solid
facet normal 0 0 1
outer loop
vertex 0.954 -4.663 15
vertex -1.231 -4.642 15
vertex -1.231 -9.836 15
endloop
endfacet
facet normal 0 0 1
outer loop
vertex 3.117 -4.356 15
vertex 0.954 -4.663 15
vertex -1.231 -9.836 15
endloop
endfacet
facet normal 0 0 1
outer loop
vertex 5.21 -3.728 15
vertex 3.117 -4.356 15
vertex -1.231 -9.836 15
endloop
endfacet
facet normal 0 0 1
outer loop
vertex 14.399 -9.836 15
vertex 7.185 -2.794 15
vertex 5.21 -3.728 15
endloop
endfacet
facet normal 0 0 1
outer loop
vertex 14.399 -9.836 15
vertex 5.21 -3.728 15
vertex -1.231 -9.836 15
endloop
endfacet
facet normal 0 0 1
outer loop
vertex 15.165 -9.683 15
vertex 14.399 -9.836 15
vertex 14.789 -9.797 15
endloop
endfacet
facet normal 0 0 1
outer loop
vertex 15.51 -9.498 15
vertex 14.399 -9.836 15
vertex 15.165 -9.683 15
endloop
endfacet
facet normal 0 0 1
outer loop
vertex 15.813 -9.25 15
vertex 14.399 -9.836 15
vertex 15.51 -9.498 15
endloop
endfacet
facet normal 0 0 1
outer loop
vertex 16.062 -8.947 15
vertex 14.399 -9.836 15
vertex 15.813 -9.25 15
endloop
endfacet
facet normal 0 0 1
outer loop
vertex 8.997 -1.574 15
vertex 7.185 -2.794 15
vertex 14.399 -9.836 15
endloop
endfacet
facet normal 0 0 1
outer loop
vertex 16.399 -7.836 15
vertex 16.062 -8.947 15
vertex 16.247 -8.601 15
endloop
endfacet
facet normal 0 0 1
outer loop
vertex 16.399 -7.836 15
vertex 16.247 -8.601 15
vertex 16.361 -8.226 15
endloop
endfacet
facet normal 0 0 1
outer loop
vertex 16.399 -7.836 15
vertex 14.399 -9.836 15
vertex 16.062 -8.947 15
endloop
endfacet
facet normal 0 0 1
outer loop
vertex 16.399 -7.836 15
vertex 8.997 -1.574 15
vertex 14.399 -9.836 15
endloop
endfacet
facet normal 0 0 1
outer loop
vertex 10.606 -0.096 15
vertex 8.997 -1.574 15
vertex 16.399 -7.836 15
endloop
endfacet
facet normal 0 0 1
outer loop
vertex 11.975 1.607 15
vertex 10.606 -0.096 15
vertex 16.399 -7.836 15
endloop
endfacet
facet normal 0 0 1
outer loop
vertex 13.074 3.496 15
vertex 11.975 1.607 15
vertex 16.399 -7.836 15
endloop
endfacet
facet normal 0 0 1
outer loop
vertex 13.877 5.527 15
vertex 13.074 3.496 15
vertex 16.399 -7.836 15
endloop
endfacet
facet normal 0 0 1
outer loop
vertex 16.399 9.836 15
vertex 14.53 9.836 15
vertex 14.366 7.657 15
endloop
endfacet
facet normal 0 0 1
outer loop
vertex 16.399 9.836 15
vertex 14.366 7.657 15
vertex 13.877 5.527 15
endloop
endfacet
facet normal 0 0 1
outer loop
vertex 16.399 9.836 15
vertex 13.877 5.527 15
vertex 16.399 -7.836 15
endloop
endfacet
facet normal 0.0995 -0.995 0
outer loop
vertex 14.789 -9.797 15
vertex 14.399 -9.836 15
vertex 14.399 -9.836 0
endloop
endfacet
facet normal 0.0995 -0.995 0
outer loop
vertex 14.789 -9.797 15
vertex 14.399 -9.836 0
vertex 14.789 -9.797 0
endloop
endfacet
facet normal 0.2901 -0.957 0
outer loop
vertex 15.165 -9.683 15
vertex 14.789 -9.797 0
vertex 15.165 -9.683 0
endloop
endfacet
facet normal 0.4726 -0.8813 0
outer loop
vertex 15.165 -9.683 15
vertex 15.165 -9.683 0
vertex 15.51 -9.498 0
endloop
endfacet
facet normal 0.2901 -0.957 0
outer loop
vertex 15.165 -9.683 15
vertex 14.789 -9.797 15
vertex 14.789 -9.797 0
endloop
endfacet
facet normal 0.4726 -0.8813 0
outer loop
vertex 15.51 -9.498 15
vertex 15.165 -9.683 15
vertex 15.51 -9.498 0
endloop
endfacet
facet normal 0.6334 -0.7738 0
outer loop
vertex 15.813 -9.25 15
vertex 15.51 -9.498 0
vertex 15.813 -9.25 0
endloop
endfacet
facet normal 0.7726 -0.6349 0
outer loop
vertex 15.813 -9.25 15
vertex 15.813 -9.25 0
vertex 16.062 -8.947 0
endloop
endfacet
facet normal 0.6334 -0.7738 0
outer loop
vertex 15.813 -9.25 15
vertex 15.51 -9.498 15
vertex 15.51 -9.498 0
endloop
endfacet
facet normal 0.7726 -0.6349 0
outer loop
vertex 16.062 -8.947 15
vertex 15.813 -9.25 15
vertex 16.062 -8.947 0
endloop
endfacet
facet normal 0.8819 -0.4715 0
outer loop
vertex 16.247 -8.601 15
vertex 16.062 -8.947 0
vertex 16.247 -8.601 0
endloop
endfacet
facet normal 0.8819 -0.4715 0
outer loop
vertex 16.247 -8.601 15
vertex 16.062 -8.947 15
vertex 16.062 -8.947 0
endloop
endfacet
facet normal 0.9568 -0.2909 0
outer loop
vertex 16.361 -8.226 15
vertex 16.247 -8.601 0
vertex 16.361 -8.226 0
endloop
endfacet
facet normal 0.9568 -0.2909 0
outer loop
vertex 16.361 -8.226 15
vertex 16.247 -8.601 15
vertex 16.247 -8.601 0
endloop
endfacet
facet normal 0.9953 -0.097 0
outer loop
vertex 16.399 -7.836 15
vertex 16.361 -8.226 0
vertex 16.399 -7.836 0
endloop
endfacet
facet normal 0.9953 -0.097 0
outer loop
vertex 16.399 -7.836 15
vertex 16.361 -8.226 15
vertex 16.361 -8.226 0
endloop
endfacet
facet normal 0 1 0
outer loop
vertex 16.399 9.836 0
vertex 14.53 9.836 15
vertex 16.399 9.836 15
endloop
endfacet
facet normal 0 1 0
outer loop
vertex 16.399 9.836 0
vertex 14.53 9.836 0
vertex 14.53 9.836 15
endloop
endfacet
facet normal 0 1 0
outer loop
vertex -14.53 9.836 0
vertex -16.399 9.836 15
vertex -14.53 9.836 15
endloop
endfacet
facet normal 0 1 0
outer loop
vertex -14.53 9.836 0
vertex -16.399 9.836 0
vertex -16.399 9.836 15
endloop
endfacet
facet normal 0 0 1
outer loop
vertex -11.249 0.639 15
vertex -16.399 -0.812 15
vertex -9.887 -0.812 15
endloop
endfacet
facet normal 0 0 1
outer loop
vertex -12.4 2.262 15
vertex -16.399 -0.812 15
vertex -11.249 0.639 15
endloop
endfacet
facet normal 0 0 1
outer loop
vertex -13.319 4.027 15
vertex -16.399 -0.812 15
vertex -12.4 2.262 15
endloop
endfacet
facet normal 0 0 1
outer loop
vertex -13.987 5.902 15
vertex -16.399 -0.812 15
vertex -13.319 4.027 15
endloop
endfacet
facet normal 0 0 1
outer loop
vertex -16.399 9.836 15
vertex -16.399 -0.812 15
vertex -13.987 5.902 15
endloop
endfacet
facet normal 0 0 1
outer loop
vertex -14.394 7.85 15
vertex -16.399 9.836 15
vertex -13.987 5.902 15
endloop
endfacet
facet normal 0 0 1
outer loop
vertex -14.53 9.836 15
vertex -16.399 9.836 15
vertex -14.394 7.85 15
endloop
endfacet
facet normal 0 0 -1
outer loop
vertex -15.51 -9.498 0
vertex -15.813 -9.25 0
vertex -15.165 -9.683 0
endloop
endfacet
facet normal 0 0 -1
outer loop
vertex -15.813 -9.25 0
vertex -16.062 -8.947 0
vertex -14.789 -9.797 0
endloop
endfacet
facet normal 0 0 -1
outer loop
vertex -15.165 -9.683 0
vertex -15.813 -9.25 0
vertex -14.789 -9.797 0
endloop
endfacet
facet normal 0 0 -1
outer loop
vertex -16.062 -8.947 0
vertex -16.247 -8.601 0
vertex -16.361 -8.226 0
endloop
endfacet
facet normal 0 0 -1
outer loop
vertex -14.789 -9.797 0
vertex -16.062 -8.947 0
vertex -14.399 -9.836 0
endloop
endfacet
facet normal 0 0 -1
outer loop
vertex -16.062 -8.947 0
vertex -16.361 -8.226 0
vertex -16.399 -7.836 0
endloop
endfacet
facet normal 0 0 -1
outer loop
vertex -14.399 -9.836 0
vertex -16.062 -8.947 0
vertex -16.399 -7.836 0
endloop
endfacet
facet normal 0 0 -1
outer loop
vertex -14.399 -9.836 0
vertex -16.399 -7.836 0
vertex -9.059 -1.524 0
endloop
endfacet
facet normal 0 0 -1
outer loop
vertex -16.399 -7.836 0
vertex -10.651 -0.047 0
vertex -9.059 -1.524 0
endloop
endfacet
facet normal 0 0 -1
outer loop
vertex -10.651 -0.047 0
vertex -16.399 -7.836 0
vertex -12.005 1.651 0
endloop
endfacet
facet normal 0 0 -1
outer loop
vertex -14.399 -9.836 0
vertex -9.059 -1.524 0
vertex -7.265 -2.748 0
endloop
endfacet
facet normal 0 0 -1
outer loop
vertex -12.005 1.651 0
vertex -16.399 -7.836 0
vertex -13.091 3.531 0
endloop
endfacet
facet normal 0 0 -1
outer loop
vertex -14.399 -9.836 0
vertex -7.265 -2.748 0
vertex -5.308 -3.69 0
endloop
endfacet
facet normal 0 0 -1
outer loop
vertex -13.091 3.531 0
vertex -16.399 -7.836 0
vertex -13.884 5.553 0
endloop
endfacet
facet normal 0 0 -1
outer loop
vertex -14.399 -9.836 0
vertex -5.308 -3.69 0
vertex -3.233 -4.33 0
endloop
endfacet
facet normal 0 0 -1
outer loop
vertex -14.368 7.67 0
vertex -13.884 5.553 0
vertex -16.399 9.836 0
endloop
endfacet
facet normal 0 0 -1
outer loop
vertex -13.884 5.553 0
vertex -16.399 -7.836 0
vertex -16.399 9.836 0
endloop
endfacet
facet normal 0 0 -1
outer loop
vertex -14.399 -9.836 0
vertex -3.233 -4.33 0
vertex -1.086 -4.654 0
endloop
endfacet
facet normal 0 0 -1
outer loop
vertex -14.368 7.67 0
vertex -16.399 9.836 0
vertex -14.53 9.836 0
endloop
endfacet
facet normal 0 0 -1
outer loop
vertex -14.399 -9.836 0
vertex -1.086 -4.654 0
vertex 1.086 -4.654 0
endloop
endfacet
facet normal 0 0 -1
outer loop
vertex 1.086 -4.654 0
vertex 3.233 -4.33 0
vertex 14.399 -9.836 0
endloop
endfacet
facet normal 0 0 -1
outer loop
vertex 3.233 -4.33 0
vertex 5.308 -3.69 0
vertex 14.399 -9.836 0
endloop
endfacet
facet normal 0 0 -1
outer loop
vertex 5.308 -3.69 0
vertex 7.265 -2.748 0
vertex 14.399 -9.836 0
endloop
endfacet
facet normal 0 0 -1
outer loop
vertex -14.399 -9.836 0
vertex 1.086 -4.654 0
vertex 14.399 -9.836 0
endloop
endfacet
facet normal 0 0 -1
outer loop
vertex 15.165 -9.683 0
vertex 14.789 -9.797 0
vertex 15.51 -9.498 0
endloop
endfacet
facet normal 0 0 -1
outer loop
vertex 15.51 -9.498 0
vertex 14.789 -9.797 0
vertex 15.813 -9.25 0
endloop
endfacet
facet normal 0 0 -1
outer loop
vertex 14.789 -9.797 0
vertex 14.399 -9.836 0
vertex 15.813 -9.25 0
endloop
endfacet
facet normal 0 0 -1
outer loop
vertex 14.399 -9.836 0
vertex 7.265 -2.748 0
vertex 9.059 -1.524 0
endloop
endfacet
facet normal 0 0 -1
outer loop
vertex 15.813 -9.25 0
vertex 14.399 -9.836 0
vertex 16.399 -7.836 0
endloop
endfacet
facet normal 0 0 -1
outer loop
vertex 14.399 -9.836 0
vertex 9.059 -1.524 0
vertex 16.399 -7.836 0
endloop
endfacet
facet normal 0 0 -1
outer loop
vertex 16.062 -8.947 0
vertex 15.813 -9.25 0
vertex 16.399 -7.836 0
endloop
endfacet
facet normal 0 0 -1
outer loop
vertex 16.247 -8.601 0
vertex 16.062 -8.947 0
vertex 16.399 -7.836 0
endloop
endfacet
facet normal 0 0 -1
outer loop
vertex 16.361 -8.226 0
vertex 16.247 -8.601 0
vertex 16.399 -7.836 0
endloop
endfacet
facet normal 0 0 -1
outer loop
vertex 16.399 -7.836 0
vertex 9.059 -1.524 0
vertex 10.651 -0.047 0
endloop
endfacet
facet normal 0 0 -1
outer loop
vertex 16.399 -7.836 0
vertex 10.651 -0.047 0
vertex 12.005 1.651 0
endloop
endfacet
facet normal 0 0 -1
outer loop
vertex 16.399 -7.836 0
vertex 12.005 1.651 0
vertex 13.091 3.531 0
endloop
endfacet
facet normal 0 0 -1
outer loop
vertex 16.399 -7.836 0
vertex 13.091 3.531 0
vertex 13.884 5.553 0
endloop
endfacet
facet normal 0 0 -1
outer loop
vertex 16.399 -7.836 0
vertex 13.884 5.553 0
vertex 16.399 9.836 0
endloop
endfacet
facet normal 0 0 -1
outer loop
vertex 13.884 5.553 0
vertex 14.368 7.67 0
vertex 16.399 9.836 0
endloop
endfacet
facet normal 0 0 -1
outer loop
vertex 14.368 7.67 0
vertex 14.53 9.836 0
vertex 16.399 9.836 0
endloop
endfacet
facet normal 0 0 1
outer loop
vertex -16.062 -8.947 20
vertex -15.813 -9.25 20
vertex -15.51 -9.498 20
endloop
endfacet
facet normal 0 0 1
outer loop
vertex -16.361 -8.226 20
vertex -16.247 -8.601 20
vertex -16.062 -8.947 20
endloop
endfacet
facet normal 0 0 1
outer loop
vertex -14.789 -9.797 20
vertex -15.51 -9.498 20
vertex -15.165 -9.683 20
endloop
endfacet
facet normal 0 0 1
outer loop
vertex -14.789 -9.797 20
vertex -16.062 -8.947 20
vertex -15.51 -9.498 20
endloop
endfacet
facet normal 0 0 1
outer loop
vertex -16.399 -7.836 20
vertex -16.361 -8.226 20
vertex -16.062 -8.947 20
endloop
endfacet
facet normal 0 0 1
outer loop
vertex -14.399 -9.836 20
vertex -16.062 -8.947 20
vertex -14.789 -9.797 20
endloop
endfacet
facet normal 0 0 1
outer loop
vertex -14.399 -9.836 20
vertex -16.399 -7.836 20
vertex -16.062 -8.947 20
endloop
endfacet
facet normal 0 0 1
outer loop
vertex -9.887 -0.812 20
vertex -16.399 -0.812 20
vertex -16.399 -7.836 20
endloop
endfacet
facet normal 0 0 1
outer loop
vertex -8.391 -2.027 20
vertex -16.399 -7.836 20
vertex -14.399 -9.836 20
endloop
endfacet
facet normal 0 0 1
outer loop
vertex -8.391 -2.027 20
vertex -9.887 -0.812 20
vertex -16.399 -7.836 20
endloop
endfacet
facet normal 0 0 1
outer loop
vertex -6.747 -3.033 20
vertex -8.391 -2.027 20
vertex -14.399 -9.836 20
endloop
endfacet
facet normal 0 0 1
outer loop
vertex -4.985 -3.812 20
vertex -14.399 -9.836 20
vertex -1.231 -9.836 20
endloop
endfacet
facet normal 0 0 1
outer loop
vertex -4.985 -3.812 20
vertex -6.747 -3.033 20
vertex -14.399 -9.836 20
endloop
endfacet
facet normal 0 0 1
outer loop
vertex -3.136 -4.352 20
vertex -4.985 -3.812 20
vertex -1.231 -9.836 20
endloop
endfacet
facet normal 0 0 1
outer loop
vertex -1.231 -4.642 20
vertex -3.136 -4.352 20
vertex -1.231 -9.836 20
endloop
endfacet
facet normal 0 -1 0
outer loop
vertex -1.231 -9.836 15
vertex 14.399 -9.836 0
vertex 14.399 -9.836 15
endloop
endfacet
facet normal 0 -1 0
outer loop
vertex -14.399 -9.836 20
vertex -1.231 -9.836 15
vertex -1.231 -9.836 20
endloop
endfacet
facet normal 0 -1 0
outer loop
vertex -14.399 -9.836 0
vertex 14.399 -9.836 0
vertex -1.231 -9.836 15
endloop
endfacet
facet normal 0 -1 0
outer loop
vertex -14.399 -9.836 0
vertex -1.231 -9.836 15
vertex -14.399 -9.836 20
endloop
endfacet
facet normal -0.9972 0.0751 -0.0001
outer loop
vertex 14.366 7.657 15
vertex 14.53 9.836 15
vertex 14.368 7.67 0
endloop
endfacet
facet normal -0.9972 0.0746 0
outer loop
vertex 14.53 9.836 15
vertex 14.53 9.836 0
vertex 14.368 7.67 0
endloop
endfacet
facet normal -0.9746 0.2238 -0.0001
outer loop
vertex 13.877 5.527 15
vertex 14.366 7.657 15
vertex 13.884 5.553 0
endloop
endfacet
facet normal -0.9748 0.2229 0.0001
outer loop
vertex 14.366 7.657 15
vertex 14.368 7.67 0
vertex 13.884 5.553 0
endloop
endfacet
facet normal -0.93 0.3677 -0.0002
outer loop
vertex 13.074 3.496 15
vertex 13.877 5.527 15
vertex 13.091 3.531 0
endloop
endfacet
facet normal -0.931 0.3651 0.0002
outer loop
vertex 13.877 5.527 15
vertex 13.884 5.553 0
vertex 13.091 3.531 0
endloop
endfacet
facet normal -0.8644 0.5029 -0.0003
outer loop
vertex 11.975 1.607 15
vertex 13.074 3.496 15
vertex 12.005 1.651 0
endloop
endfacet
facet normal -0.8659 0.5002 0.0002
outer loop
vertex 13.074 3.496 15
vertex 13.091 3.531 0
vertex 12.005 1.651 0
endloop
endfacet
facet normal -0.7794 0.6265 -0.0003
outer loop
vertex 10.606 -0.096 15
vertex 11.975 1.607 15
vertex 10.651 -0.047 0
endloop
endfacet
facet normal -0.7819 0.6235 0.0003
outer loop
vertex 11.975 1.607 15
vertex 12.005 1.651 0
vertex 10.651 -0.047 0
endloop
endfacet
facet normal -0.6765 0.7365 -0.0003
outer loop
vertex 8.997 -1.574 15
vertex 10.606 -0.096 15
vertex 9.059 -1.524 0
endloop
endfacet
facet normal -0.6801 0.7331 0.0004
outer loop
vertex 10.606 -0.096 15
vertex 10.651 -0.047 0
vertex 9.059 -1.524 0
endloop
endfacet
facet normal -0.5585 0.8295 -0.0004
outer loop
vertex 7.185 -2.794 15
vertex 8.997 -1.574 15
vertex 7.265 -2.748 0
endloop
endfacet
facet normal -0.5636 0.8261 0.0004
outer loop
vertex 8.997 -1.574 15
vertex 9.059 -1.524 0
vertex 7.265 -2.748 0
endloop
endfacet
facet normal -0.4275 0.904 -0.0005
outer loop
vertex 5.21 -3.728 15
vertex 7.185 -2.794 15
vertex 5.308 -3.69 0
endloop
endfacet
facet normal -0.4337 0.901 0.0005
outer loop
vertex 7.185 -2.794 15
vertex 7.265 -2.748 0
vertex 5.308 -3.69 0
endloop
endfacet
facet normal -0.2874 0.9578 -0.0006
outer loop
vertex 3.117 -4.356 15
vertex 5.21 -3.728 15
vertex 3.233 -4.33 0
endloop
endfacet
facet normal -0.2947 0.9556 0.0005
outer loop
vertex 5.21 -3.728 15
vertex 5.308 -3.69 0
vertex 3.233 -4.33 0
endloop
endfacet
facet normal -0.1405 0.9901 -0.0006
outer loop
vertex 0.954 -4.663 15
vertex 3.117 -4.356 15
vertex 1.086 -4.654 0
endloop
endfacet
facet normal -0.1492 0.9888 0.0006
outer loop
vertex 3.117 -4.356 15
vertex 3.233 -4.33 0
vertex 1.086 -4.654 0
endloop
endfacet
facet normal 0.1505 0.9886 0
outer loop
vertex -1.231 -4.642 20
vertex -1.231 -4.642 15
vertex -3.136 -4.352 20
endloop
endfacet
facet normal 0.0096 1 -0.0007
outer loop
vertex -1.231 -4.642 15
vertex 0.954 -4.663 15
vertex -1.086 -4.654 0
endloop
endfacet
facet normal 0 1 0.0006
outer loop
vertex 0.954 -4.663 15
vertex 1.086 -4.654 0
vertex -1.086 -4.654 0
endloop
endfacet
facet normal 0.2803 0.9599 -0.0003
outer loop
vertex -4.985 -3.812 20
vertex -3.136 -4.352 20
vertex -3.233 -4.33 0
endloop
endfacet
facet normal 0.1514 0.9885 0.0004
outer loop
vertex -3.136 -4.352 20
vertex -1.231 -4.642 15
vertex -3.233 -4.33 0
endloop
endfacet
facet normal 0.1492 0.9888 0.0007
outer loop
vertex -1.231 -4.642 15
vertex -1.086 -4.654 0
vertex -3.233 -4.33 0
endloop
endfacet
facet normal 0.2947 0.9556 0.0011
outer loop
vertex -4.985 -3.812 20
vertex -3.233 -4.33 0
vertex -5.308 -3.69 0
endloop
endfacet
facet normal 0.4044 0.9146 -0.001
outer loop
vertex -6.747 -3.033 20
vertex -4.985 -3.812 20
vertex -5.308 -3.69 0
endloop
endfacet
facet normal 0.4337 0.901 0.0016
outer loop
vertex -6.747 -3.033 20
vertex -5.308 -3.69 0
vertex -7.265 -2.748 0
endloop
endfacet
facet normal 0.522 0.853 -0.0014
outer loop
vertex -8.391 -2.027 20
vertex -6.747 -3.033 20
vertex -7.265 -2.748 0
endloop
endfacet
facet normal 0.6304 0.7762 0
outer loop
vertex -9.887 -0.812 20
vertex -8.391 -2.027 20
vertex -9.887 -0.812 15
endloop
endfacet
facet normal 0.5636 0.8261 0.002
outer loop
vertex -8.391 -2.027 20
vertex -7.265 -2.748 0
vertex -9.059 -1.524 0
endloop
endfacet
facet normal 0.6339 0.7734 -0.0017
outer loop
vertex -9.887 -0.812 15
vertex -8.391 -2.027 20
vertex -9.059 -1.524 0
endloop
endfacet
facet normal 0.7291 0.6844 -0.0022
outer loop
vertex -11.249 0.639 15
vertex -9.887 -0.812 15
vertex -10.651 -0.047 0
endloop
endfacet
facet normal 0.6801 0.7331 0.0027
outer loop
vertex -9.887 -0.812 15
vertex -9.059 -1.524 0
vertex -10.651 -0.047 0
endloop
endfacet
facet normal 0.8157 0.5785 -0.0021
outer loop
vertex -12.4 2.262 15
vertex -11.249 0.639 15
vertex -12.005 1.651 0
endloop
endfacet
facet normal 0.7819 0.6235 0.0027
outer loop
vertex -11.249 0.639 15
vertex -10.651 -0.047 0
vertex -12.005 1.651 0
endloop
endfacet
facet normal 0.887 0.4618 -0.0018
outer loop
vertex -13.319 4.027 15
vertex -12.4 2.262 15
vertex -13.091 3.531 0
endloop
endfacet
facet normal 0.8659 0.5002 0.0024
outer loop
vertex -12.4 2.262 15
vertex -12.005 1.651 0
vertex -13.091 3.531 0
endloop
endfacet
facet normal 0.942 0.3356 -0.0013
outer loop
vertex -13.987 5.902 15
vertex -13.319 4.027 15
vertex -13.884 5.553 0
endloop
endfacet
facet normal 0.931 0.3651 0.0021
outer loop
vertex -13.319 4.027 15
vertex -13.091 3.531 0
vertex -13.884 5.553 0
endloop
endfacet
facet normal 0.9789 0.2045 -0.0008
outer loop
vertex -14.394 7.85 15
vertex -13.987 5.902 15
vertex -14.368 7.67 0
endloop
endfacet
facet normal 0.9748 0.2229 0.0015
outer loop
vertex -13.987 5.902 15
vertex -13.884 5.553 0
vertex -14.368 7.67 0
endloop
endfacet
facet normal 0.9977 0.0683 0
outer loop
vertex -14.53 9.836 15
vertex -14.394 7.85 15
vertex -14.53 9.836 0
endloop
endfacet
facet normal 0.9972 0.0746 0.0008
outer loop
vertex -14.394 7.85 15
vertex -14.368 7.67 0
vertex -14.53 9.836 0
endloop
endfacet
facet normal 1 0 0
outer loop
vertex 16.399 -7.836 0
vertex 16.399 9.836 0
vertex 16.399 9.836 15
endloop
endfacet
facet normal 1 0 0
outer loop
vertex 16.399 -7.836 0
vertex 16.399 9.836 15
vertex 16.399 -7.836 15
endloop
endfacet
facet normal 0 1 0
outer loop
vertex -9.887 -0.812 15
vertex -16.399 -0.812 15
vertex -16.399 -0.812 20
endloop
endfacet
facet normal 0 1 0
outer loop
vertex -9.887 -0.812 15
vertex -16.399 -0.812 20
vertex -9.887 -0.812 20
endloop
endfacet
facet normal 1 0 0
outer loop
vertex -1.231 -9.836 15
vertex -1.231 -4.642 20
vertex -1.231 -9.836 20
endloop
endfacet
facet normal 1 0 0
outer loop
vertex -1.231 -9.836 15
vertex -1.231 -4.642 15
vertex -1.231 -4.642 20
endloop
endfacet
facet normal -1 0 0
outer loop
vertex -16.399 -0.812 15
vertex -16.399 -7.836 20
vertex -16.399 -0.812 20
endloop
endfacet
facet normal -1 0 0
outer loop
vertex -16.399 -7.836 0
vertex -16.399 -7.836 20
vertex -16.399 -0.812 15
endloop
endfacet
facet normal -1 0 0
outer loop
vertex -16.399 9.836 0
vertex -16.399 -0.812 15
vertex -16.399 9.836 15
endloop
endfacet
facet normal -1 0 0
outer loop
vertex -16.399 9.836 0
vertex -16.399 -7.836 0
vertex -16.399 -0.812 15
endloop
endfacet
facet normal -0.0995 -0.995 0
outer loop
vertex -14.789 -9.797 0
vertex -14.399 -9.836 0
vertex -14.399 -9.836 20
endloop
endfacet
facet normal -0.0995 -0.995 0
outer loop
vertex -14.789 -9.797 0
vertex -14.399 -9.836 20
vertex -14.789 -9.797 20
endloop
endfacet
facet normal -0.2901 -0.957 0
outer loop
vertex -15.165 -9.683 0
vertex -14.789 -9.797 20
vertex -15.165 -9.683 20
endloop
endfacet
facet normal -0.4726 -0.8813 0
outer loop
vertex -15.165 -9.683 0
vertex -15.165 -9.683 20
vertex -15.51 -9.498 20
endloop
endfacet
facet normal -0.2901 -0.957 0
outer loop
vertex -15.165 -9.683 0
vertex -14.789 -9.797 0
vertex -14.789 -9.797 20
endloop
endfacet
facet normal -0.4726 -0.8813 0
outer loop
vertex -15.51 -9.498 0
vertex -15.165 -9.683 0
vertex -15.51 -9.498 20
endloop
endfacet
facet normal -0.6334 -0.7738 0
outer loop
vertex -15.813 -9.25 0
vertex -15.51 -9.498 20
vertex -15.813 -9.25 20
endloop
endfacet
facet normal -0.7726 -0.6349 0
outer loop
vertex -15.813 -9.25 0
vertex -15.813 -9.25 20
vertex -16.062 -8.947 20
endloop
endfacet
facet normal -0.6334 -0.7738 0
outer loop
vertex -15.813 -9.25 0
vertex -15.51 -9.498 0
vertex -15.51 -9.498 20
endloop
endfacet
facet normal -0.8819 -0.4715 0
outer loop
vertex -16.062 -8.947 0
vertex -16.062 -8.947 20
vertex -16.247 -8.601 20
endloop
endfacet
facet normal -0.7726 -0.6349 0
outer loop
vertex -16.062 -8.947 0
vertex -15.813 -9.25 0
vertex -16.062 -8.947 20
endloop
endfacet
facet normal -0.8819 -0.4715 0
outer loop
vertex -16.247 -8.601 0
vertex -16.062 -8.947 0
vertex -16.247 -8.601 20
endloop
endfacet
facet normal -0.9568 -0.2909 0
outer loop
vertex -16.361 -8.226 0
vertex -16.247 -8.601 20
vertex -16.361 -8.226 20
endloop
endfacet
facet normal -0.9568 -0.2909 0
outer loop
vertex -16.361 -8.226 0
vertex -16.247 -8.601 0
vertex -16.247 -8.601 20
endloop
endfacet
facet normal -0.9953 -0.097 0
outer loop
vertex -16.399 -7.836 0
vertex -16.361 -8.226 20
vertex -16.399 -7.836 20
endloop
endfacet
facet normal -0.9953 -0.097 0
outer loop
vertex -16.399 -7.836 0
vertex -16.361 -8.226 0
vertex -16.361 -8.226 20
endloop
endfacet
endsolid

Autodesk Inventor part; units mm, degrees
ref_plane "YZ Plane" through (0, 0, 0) normal (1, 0, 0) x (0, 1, 0)
ref_plane "XZ Plane" through (0, 0, 0) normal (0, 1, 0) x (-1, 0, 0)
ref_plane "XY Plane" through (0, 0, 0) normal (0, 0, 1) x (1, 0, 0)
sketch "스케치1" plane through (0, 0, 0) normal (0, 0, 1) x (1, 0, 0)
  line L0 (16.3992, -9.8355) -> (-16.3992, -9.8355)
  line L1 (-16.3992, -9.8355) -> (-16.3992, 9.8355)
  line L2 (-16.3992, 9.8355) -> (16.3992, 9.8355)
  line L3 (16.3992, 9.8355) -> (16.3992, -9.8355)
  line L4 (16.3992, -9.8355) -> (-16.3992, 9.8355) construction
  line L5 (-16.3992, -9.8355) -> (16.3992, 9.8355) construction
  point P0 (0, 0)
extrude "돌출1" add sketch "스케치1" along normal blind 15
sketch "스케치2" plane through (0, 0, 15) normal (0, 0, 1) x (1, 0, 0)
  line L0 (-16.3992, 9.8355) -> (-16.3992, -9.8355) projected
  line L1 (-16.3992, -9.8355) -> (16.3992, -9.8355) projected
  line L2 (-16.3992, -0.8122) -> (-1.2307, -0.8122)
  line L3 (-1.2307, -0.8122) -> (-1.2307, -9.8355)
  line L4 (-1.2307, -9.8355) -> (-16.3992, -9.8355)
  line L5 (-16.3992, -9.8355) -> (-16.3992, -0.8122)
  point P0 (0, 0)
extrude "돌출2" add sketch "스케치2" along normal blind 5
sketch "스케치3" plane through (0, 0, 15) normal (0, 0, 1) x (1, 0, 0)
  point P0 (0, 0)
sketch "스케치4" plane through (0, 0, 0) normal (0, 0, -1) x (-1, 0, 0)
  line L0 (-16.3992, 9.8355) -> (16.3992, 9.8355) projected
  circle A0 centre (0, 9.8355) radius 14.5299
  point P0 (0, 0)
extrude "돌출3" cut sketch "스케치4" against normal blind 20
fillet "모깎기1" radius 2 1 edges at (16.3992, -9.8355, 7.5)
fillet "모깎기2" radius 2 1 edges at (-16.3992, -9.8355, 10)
properties part number "240503_3Dsketch12"
